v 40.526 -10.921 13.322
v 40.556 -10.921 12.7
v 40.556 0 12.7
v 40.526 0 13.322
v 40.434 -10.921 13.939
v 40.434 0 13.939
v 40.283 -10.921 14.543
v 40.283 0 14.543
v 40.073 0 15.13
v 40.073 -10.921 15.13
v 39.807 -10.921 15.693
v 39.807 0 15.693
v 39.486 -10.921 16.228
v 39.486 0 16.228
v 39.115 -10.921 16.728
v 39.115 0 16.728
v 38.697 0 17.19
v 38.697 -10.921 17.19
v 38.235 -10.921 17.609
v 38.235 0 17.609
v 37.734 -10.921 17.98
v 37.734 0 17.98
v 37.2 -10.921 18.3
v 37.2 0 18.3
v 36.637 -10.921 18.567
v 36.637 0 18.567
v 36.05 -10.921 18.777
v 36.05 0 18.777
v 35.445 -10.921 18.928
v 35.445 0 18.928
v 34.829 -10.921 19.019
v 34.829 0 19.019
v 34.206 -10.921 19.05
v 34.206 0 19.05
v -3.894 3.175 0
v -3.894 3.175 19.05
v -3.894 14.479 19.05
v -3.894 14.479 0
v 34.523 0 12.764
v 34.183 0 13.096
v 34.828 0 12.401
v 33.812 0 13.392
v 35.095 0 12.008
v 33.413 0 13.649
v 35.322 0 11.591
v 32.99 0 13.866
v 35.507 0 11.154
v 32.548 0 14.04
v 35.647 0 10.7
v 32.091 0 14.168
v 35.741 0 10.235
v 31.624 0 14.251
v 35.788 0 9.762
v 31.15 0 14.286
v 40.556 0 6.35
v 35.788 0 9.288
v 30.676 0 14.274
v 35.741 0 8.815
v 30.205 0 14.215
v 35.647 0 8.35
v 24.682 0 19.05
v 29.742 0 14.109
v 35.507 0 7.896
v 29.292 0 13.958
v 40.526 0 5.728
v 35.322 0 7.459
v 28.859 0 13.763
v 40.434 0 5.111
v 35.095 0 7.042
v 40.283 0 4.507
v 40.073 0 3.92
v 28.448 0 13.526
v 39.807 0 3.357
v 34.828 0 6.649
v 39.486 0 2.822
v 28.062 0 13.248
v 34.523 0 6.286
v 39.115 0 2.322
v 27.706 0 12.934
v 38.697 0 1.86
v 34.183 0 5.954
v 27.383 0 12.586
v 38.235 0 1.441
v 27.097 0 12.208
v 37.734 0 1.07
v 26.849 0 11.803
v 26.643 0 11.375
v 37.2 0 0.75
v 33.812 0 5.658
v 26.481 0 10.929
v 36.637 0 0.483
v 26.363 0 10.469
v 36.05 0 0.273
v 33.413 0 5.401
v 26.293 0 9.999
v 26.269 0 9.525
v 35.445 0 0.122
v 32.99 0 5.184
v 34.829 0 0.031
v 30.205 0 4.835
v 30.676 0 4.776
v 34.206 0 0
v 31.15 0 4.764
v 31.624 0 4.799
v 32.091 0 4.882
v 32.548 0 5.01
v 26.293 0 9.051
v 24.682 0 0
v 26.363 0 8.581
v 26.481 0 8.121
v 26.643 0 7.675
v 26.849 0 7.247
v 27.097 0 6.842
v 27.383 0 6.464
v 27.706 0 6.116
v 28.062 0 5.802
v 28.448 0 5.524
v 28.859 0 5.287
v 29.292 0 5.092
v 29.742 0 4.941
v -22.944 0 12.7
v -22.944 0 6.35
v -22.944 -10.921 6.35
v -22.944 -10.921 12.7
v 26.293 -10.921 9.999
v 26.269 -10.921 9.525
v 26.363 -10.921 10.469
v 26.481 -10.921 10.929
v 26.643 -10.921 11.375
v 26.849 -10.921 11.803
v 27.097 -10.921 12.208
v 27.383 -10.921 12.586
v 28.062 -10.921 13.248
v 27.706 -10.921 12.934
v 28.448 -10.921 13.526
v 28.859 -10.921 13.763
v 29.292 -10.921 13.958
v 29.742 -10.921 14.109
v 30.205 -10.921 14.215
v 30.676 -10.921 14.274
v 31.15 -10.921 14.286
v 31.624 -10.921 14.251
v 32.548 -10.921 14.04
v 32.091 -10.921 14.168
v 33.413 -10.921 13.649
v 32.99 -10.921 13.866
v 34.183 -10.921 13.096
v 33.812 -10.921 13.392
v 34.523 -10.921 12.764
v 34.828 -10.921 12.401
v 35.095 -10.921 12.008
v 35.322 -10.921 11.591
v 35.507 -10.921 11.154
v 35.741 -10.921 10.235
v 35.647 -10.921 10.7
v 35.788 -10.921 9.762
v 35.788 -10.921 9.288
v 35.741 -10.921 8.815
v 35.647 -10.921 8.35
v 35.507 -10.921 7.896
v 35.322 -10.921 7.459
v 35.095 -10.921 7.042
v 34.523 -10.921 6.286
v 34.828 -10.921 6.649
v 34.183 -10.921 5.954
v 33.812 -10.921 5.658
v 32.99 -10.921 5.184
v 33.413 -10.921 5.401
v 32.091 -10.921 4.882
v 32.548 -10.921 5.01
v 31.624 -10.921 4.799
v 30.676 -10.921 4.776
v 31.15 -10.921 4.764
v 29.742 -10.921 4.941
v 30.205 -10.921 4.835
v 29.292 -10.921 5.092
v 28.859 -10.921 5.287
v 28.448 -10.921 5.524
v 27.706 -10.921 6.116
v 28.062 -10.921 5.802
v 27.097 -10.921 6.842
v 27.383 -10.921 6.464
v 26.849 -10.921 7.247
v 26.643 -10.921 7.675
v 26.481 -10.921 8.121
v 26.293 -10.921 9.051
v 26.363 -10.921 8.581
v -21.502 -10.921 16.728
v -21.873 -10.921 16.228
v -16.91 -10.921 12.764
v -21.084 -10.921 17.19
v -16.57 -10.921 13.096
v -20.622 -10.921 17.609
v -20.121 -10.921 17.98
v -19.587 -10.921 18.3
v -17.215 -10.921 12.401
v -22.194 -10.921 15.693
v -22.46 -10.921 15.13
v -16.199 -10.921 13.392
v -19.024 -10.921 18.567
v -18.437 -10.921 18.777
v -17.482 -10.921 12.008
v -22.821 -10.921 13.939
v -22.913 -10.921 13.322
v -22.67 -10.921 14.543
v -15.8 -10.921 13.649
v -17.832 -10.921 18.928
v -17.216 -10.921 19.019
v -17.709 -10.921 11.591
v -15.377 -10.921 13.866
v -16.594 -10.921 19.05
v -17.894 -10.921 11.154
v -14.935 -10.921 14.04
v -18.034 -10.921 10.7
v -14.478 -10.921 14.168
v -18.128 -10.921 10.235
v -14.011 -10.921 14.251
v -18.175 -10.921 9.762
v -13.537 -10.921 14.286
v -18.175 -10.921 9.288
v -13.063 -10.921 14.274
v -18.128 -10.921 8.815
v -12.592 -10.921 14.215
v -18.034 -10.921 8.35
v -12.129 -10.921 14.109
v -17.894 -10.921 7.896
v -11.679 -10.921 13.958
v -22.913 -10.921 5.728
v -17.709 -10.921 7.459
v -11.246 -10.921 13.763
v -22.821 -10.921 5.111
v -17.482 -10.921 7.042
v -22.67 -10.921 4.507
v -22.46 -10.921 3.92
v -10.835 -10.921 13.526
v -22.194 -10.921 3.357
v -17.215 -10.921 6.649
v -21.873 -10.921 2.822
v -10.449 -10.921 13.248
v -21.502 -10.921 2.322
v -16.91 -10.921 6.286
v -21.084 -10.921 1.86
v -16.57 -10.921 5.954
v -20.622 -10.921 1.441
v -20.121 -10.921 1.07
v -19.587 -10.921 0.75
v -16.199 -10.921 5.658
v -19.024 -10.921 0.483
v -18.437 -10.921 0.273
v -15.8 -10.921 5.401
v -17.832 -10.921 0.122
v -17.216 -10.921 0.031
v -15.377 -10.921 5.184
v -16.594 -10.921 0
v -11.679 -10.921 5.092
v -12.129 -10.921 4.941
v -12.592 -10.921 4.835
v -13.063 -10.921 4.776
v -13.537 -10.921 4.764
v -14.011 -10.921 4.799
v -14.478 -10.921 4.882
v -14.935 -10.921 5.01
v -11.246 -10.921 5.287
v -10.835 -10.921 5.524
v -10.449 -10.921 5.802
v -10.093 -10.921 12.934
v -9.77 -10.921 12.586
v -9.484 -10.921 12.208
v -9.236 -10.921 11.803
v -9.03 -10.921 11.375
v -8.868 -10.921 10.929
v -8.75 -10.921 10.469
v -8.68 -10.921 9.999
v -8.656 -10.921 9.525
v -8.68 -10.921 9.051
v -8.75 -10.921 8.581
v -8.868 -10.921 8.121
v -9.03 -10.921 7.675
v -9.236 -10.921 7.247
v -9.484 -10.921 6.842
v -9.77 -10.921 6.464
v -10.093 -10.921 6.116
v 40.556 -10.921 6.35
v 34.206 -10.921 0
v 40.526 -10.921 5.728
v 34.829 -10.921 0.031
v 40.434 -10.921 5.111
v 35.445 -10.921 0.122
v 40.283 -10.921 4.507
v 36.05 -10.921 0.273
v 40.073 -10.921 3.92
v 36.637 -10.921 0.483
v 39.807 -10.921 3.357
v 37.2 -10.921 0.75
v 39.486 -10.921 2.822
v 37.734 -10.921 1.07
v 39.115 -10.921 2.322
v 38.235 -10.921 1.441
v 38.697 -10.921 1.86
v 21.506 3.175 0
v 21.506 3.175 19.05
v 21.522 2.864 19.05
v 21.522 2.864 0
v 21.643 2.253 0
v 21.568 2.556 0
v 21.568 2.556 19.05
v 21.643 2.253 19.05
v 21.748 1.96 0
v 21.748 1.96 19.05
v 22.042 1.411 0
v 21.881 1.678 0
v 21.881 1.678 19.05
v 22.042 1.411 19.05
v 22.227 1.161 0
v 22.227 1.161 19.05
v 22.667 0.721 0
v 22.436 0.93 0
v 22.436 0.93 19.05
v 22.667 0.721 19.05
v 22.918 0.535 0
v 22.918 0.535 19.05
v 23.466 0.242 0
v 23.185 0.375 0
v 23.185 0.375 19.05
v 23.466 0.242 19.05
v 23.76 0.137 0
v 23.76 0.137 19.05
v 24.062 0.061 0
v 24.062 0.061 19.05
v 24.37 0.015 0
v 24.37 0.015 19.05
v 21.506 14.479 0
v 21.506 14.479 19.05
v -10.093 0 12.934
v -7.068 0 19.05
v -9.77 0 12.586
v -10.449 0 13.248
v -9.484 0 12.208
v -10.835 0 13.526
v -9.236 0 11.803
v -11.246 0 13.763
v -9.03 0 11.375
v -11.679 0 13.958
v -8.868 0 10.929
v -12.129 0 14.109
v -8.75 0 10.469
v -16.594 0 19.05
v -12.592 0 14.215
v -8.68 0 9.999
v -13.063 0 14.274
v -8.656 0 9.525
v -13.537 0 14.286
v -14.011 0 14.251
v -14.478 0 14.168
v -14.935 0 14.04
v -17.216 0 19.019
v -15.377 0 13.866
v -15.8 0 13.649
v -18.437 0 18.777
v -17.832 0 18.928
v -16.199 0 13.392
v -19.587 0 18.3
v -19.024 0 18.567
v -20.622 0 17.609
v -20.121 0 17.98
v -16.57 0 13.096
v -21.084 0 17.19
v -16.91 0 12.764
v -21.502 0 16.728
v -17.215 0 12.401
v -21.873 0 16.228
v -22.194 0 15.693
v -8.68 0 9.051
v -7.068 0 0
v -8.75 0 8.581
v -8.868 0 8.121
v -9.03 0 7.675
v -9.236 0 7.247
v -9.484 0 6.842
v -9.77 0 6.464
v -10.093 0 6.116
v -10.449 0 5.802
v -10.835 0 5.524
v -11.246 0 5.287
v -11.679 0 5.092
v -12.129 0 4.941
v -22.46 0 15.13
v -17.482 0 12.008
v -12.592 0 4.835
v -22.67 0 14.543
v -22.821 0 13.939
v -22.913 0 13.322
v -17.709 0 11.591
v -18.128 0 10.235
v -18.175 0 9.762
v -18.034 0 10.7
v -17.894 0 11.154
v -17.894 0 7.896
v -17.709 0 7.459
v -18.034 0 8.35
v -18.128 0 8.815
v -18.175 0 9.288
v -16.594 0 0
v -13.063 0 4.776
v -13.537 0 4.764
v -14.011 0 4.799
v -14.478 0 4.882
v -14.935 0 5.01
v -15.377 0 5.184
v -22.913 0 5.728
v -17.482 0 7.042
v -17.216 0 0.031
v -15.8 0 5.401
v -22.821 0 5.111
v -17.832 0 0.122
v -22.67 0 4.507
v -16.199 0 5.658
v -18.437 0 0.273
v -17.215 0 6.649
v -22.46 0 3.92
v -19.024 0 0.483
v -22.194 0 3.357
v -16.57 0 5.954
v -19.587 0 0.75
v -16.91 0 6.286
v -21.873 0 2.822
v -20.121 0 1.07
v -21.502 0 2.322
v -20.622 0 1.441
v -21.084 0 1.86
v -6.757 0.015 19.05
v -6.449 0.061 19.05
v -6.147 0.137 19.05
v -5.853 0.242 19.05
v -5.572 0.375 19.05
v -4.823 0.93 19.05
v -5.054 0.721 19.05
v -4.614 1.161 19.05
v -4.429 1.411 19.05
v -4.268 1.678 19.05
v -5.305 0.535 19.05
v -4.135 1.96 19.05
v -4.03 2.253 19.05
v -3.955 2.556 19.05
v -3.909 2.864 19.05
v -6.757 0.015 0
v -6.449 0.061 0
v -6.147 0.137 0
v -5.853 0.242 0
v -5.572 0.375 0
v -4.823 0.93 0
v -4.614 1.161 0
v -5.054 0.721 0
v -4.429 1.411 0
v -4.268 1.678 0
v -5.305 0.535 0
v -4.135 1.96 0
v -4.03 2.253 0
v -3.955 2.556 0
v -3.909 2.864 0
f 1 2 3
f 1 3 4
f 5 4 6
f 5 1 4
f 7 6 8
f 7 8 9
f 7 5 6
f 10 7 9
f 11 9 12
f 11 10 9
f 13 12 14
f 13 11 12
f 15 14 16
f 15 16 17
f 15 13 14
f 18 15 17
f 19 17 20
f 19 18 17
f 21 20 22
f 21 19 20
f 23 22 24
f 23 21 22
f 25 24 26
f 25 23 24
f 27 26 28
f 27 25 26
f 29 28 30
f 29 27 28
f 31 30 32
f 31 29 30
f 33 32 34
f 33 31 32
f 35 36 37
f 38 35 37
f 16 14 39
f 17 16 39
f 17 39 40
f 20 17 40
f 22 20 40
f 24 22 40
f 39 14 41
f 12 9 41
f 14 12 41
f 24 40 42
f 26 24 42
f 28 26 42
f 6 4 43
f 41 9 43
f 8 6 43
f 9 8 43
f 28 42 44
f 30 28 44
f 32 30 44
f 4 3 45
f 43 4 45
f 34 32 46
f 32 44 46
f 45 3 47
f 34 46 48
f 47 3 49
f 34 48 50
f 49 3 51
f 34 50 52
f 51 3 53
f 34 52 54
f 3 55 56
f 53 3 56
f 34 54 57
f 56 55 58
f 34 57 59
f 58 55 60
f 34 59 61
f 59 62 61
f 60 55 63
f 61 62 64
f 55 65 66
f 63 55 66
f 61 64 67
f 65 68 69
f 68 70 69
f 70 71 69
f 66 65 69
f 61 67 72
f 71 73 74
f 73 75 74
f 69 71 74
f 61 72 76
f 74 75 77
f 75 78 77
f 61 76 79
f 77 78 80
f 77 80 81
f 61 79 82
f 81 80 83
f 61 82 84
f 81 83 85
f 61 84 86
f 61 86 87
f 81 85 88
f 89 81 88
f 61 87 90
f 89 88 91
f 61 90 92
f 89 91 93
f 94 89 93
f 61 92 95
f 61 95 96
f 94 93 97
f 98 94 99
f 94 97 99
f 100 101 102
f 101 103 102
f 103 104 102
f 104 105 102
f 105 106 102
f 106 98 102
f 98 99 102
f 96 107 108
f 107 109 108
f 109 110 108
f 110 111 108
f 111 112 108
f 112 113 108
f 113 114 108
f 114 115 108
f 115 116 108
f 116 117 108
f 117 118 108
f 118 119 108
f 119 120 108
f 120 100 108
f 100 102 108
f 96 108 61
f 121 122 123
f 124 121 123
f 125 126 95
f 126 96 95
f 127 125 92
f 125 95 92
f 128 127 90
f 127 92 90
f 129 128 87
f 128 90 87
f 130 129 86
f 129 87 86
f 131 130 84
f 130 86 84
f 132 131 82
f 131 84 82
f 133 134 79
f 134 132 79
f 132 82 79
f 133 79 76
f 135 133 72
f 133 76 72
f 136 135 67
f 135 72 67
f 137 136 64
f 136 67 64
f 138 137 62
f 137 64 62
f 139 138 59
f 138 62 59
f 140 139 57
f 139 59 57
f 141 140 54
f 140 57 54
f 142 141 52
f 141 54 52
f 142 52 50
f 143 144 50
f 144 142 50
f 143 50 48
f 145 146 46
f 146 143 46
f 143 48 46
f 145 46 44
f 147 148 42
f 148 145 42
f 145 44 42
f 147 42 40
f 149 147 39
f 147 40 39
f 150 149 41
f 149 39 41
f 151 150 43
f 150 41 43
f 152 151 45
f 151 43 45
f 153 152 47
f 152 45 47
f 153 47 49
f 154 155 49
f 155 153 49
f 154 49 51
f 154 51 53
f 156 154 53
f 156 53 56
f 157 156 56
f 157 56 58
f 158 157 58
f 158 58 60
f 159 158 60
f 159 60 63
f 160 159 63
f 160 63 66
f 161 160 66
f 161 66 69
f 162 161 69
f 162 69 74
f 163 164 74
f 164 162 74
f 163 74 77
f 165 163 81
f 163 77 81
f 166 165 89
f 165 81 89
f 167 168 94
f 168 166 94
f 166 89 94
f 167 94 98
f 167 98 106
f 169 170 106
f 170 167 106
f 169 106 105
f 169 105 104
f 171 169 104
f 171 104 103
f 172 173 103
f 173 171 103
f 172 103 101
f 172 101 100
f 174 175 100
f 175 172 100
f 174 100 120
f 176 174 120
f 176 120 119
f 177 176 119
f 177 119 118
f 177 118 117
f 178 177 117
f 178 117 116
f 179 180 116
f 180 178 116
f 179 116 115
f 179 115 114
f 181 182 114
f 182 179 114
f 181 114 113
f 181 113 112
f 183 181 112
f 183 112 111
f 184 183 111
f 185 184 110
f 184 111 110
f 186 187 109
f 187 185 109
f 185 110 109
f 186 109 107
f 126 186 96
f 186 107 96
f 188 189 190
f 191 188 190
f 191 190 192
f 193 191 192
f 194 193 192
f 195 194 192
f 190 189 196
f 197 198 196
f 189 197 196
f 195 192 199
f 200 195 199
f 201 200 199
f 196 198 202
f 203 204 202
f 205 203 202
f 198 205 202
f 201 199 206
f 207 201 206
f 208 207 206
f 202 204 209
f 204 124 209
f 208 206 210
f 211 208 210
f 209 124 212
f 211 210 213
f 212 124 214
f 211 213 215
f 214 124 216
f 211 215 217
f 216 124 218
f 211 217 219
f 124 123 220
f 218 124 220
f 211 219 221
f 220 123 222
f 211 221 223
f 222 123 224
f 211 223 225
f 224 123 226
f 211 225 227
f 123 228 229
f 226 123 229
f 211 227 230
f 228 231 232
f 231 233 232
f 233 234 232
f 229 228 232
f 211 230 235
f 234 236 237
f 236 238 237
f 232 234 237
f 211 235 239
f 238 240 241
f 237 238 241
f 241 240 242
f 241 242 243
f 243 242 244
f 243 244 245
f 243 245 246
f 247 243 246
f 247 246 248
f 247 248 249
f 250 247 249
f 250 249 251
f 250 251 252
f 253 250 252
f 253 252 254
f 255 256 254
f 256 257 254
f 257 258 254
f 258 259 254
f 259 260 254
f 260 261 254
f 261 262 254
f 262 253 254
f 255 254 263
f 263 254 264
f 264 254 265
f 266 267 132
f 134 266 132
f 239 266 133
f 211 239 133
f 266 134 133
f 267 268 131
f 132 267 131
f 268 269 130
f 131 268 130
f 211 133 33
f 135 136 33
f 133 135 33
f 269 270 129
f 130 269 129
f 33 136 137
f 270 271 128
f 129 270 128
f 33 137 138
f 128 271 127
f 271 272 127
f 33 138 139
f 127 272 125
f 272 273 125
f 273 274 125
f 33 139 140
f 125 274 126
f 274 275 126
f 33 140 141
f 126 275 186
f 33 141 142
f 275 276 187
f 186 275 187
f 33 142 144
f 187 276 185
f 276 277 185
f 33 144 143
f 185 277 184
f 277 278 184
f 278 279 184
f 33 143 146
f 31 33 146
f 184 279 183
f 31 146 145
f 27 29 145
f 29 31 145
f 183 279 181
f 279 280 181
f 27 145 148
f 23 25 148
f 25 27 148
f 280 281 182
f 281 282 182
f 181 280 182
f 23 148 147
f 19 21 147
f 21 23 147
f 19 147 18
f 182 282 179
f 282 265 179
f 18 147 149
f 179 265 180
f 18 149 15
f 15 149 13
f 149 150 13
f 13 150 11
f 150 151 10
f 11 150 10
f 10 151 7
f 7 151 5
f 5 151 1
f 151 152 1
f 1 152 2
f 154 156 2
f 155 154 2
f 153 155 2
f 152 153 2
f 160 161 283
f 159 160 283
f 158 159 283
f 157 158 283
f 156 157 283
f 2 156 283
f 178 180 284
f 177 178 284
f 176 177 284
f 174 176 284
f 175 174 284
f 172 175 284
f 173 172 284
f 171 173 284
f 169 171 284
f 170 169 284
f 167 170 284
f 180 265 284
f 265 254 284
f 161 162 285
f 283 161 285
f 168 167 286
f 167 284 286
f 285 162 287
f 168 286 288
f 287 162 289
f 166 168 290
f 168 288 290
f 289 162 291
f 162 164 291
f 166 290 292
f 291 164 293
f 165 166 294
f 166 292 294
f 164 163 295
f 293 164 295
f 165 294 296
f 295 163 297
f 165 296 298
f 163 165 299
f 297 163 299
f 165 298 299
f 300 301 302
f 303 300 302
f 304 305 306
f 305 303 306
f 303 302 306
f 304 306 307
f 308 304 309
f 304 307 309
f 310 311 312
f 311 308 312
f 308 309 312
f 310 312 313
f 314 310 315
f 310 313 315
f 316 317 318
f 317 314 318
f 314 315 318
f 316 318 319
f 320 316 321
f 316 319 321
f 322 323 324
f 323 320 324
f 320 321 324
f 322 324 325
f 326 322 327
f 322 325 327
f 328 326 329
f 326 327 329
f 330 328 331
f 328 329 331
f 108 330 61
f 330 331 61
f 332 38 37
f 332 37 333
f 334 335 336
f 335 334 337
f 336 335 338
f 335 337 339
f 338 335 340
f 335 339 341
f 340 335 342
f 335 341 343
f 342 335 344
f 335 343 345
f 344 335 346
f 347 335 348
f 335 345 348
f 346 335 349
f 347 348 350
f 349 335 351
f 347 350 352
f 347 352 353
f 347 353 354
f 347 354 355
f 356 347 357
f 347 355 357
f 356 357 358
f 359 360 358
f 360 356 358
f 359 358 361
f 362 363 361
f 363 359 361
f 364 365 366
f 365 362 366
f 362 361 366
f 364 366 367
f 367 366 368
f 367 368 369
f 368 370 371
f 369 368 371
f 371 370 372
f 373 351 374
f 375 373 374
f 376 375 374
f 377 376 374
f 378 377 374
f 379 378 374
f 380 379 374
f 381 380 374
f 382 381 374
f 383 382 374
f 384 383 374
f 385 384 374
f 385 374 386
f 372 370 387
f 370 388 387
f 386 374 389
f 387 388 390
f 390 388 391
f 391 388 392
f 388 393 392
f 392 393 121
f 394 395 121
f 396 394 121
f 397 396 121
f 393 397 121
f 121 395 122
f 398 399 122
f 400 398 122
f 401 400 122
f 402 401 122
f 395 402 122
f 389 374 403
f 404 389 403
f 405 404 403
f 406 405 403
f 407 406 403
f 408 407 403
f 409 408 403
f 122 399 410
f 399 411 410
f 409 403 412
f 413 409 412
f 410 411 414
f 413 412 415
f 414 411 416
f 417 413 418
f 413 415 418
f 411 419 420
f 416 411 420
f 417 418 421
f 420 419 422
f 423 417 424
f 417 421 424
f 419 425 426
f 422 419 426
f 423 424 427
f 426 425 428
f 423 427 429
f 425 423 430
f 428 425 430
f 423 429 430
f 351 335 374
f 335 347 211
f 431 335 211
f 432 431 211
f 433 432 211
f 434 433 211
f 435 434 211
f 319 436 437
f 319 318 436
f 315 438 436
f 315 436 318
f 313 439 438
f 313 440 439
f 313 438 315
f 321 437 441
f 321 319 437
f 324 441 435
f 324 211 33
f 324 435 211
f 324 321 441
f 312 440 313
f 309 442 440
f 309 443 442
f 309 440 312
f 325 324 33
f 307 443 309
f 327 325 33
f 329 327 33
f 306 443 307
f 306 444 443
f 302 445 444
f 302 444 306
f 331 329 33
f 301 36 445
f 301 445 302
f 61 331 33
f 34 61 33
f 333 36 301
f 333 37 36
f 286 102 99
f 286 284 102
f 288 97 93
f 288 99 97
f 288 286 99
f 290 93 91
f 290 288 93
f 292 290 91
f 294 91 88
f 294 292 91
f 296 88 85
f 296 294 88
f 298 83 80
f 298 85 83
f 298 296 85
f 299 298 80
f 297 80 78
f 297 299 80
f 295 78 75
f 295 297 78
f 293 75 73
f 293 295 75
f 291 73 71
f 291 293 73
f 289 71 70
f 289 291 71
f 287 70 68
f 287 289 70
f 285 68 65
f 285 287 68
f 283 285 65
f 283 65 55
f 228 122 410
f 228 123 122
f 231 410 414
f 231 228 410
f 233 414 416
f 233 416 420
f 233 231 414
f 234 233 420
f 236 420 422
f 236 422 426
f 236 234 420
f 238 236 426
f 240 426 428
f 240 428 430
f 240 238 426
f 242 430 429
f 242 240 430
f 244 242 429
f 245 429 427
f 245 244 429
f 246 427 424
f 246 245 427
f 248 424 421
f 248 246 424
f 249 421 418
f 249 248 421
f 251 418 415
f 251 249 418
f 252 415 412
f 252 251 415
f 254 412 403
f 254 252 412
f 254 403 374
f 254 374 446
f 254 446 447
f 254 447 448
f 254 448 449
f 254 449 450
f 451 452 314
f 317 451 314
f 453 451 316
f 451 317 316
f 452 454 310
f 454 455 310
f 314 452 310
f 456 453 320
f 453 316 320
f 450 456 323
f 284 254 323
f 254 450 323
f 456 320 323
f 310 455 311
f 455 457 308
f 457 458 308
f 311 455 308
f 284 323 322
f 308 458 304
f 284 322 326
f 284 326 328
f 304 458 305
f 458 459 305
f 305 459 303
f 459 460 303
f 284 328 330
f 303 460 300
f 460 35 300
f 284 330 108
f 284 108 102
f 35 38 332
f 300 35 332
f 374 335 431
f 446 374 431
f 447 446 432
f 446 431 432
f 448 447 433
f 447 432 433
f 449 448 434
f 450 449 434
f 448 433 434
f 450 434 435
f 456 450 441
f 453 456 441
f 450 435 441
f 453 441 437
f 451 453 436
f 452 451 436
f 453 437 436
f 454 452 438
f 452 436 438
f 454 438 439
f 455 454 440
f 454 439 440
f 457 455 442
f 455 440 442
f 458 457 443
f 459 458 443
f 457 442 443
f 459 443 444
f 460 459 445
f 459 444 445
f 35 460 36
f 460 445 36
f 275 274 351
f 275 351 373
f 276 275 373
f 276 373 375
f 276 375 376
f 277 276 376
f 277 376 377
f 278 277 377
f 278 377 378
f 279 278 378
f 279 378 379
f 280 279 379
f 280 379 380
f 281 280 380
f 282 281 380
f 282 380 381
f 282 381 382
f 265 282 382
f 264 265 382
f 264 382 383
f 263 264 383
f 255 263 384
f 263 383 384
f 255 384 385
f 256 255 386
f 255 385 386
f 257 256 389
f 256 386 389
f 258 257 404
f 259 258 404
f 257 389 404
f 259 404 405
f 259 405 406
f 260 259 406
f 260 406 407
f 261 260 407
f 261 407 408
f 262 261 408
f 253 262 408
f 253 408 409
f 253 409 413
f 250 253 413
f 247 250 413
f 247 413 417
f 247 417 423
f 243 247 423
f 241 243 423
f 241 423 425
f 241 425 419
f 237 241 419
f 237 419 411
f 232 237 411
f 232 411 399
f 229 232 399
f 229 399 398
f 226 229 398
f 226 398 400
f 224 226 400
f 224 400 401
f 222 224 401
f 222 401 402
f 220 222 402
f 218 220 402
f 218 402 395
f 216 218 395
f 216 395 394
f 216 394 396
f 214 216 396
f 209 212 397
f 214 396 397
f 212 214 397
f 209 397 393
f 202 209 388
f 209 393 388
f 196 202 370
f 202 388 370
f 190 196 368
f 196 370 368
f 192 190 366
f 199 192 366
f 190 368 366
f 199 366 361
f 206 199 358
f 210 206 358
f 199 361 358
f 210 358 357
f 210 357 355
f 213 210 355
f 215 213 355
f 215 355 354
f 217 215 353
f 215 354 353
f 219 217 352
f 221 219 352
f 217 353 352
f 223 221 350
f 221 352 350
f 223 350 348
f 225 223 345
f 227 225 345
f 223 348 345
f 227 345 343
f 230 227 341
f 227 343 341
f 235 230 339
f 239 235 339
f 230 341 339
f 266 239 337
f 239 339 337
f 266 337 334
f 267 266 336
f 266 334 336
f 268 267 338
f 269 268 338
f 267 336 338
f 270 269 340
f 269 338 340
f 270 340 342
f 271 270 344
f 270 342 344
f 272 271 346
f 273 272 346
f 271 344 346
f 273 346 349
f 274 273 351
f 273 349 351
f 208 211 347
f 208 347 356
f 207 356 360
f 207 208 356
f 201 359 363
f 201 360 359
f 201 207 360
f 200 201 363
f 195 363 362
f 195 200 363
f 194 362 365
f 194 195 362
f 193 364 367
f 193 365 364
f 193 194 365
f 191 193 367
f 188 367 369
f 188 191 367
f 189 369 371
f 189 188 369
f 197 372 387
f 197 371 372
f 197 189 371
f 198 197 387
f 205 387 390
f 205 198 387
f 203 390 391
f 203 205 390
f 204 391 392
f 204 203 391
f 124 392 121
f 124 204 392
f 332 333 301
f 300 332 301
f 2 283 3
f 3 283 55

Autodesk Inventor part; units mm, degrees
ref_plane "YZ Plane" through (0, 0, 0) normal (1, 0, 0) x (0, 1, 0)
ref_plane "XZ Plane" through (0, 0, 0) normal (0, 1, 0) x (-1, 0, 0)
ref_plane "XY Plane" through (0, 0, 0) normal (0, 0, 1) x (1, 0, 0)
sketch "Sketch1" plane through (0, 0, 0) normal (0, 0, 1) x (1, 0, 0)
  point P0 (0, 0)
sketch "Sketch2" plane through (0, 0, 0) normal (0, 0, 1) x (1, 0, 0)
  line L0 (-3.8935, 14.4789) -> (8.8065, 14.4789)
  line L1 (8.8065, 14.4789) -> (8.8065, -10.9211)
  line L2 (8.8065, -10.9211) -> (-3.8935, -10.9211)
  line L3 (-3.8935, 0) -> (-3.8935, 14.4789)
  line L4 (-3.8935, 0) -> (-22.9435, 0)
  line L5 (-22.9435, 0) -> (-22.9435, -10.9211)
  line L6 (-22.9435, -10.9211) -> (-3.8935, -10.9211)
  point P0 (0, 0)
  dimension "d1" = 25.4
extrude "Extrusion1" add sketch "Sketch2" along normal blind 19.05
fillet "Fillet1" radius 6.35 2 edges at (-22.9435, -5.4605, 0) (-22.9435, -5.4605, 19.05)
fillet "Fillet2" radius 3.175 1 edges at (-3.8935, 0, 9.525)
sketch "Sketch3" plane through (-22.9435, 0, 12.7) normal (0, 1, 0) x (1, 0, 0)
  circle A0 centre (9.525, 3.175) radius 4.7625
  line L0 (0, 6.35) -> (0, 0) projected
  line L1 (15.875, -6.35) -> (6.35, -6.35) projected
  point P0 (22.9435, 12.7)
  dimension "d7" = 9.525
  dimension "d8" = 9.525
  dimension "d9" = 9.525
extrude "Extrusion2" cut sketch "Sketch3" against normal through all
mirror "Mirror1" about plane through (8.8065, -10.9211, 0) normal (1, 0, 0)
properties part number "5.5bFeatureApplication"
